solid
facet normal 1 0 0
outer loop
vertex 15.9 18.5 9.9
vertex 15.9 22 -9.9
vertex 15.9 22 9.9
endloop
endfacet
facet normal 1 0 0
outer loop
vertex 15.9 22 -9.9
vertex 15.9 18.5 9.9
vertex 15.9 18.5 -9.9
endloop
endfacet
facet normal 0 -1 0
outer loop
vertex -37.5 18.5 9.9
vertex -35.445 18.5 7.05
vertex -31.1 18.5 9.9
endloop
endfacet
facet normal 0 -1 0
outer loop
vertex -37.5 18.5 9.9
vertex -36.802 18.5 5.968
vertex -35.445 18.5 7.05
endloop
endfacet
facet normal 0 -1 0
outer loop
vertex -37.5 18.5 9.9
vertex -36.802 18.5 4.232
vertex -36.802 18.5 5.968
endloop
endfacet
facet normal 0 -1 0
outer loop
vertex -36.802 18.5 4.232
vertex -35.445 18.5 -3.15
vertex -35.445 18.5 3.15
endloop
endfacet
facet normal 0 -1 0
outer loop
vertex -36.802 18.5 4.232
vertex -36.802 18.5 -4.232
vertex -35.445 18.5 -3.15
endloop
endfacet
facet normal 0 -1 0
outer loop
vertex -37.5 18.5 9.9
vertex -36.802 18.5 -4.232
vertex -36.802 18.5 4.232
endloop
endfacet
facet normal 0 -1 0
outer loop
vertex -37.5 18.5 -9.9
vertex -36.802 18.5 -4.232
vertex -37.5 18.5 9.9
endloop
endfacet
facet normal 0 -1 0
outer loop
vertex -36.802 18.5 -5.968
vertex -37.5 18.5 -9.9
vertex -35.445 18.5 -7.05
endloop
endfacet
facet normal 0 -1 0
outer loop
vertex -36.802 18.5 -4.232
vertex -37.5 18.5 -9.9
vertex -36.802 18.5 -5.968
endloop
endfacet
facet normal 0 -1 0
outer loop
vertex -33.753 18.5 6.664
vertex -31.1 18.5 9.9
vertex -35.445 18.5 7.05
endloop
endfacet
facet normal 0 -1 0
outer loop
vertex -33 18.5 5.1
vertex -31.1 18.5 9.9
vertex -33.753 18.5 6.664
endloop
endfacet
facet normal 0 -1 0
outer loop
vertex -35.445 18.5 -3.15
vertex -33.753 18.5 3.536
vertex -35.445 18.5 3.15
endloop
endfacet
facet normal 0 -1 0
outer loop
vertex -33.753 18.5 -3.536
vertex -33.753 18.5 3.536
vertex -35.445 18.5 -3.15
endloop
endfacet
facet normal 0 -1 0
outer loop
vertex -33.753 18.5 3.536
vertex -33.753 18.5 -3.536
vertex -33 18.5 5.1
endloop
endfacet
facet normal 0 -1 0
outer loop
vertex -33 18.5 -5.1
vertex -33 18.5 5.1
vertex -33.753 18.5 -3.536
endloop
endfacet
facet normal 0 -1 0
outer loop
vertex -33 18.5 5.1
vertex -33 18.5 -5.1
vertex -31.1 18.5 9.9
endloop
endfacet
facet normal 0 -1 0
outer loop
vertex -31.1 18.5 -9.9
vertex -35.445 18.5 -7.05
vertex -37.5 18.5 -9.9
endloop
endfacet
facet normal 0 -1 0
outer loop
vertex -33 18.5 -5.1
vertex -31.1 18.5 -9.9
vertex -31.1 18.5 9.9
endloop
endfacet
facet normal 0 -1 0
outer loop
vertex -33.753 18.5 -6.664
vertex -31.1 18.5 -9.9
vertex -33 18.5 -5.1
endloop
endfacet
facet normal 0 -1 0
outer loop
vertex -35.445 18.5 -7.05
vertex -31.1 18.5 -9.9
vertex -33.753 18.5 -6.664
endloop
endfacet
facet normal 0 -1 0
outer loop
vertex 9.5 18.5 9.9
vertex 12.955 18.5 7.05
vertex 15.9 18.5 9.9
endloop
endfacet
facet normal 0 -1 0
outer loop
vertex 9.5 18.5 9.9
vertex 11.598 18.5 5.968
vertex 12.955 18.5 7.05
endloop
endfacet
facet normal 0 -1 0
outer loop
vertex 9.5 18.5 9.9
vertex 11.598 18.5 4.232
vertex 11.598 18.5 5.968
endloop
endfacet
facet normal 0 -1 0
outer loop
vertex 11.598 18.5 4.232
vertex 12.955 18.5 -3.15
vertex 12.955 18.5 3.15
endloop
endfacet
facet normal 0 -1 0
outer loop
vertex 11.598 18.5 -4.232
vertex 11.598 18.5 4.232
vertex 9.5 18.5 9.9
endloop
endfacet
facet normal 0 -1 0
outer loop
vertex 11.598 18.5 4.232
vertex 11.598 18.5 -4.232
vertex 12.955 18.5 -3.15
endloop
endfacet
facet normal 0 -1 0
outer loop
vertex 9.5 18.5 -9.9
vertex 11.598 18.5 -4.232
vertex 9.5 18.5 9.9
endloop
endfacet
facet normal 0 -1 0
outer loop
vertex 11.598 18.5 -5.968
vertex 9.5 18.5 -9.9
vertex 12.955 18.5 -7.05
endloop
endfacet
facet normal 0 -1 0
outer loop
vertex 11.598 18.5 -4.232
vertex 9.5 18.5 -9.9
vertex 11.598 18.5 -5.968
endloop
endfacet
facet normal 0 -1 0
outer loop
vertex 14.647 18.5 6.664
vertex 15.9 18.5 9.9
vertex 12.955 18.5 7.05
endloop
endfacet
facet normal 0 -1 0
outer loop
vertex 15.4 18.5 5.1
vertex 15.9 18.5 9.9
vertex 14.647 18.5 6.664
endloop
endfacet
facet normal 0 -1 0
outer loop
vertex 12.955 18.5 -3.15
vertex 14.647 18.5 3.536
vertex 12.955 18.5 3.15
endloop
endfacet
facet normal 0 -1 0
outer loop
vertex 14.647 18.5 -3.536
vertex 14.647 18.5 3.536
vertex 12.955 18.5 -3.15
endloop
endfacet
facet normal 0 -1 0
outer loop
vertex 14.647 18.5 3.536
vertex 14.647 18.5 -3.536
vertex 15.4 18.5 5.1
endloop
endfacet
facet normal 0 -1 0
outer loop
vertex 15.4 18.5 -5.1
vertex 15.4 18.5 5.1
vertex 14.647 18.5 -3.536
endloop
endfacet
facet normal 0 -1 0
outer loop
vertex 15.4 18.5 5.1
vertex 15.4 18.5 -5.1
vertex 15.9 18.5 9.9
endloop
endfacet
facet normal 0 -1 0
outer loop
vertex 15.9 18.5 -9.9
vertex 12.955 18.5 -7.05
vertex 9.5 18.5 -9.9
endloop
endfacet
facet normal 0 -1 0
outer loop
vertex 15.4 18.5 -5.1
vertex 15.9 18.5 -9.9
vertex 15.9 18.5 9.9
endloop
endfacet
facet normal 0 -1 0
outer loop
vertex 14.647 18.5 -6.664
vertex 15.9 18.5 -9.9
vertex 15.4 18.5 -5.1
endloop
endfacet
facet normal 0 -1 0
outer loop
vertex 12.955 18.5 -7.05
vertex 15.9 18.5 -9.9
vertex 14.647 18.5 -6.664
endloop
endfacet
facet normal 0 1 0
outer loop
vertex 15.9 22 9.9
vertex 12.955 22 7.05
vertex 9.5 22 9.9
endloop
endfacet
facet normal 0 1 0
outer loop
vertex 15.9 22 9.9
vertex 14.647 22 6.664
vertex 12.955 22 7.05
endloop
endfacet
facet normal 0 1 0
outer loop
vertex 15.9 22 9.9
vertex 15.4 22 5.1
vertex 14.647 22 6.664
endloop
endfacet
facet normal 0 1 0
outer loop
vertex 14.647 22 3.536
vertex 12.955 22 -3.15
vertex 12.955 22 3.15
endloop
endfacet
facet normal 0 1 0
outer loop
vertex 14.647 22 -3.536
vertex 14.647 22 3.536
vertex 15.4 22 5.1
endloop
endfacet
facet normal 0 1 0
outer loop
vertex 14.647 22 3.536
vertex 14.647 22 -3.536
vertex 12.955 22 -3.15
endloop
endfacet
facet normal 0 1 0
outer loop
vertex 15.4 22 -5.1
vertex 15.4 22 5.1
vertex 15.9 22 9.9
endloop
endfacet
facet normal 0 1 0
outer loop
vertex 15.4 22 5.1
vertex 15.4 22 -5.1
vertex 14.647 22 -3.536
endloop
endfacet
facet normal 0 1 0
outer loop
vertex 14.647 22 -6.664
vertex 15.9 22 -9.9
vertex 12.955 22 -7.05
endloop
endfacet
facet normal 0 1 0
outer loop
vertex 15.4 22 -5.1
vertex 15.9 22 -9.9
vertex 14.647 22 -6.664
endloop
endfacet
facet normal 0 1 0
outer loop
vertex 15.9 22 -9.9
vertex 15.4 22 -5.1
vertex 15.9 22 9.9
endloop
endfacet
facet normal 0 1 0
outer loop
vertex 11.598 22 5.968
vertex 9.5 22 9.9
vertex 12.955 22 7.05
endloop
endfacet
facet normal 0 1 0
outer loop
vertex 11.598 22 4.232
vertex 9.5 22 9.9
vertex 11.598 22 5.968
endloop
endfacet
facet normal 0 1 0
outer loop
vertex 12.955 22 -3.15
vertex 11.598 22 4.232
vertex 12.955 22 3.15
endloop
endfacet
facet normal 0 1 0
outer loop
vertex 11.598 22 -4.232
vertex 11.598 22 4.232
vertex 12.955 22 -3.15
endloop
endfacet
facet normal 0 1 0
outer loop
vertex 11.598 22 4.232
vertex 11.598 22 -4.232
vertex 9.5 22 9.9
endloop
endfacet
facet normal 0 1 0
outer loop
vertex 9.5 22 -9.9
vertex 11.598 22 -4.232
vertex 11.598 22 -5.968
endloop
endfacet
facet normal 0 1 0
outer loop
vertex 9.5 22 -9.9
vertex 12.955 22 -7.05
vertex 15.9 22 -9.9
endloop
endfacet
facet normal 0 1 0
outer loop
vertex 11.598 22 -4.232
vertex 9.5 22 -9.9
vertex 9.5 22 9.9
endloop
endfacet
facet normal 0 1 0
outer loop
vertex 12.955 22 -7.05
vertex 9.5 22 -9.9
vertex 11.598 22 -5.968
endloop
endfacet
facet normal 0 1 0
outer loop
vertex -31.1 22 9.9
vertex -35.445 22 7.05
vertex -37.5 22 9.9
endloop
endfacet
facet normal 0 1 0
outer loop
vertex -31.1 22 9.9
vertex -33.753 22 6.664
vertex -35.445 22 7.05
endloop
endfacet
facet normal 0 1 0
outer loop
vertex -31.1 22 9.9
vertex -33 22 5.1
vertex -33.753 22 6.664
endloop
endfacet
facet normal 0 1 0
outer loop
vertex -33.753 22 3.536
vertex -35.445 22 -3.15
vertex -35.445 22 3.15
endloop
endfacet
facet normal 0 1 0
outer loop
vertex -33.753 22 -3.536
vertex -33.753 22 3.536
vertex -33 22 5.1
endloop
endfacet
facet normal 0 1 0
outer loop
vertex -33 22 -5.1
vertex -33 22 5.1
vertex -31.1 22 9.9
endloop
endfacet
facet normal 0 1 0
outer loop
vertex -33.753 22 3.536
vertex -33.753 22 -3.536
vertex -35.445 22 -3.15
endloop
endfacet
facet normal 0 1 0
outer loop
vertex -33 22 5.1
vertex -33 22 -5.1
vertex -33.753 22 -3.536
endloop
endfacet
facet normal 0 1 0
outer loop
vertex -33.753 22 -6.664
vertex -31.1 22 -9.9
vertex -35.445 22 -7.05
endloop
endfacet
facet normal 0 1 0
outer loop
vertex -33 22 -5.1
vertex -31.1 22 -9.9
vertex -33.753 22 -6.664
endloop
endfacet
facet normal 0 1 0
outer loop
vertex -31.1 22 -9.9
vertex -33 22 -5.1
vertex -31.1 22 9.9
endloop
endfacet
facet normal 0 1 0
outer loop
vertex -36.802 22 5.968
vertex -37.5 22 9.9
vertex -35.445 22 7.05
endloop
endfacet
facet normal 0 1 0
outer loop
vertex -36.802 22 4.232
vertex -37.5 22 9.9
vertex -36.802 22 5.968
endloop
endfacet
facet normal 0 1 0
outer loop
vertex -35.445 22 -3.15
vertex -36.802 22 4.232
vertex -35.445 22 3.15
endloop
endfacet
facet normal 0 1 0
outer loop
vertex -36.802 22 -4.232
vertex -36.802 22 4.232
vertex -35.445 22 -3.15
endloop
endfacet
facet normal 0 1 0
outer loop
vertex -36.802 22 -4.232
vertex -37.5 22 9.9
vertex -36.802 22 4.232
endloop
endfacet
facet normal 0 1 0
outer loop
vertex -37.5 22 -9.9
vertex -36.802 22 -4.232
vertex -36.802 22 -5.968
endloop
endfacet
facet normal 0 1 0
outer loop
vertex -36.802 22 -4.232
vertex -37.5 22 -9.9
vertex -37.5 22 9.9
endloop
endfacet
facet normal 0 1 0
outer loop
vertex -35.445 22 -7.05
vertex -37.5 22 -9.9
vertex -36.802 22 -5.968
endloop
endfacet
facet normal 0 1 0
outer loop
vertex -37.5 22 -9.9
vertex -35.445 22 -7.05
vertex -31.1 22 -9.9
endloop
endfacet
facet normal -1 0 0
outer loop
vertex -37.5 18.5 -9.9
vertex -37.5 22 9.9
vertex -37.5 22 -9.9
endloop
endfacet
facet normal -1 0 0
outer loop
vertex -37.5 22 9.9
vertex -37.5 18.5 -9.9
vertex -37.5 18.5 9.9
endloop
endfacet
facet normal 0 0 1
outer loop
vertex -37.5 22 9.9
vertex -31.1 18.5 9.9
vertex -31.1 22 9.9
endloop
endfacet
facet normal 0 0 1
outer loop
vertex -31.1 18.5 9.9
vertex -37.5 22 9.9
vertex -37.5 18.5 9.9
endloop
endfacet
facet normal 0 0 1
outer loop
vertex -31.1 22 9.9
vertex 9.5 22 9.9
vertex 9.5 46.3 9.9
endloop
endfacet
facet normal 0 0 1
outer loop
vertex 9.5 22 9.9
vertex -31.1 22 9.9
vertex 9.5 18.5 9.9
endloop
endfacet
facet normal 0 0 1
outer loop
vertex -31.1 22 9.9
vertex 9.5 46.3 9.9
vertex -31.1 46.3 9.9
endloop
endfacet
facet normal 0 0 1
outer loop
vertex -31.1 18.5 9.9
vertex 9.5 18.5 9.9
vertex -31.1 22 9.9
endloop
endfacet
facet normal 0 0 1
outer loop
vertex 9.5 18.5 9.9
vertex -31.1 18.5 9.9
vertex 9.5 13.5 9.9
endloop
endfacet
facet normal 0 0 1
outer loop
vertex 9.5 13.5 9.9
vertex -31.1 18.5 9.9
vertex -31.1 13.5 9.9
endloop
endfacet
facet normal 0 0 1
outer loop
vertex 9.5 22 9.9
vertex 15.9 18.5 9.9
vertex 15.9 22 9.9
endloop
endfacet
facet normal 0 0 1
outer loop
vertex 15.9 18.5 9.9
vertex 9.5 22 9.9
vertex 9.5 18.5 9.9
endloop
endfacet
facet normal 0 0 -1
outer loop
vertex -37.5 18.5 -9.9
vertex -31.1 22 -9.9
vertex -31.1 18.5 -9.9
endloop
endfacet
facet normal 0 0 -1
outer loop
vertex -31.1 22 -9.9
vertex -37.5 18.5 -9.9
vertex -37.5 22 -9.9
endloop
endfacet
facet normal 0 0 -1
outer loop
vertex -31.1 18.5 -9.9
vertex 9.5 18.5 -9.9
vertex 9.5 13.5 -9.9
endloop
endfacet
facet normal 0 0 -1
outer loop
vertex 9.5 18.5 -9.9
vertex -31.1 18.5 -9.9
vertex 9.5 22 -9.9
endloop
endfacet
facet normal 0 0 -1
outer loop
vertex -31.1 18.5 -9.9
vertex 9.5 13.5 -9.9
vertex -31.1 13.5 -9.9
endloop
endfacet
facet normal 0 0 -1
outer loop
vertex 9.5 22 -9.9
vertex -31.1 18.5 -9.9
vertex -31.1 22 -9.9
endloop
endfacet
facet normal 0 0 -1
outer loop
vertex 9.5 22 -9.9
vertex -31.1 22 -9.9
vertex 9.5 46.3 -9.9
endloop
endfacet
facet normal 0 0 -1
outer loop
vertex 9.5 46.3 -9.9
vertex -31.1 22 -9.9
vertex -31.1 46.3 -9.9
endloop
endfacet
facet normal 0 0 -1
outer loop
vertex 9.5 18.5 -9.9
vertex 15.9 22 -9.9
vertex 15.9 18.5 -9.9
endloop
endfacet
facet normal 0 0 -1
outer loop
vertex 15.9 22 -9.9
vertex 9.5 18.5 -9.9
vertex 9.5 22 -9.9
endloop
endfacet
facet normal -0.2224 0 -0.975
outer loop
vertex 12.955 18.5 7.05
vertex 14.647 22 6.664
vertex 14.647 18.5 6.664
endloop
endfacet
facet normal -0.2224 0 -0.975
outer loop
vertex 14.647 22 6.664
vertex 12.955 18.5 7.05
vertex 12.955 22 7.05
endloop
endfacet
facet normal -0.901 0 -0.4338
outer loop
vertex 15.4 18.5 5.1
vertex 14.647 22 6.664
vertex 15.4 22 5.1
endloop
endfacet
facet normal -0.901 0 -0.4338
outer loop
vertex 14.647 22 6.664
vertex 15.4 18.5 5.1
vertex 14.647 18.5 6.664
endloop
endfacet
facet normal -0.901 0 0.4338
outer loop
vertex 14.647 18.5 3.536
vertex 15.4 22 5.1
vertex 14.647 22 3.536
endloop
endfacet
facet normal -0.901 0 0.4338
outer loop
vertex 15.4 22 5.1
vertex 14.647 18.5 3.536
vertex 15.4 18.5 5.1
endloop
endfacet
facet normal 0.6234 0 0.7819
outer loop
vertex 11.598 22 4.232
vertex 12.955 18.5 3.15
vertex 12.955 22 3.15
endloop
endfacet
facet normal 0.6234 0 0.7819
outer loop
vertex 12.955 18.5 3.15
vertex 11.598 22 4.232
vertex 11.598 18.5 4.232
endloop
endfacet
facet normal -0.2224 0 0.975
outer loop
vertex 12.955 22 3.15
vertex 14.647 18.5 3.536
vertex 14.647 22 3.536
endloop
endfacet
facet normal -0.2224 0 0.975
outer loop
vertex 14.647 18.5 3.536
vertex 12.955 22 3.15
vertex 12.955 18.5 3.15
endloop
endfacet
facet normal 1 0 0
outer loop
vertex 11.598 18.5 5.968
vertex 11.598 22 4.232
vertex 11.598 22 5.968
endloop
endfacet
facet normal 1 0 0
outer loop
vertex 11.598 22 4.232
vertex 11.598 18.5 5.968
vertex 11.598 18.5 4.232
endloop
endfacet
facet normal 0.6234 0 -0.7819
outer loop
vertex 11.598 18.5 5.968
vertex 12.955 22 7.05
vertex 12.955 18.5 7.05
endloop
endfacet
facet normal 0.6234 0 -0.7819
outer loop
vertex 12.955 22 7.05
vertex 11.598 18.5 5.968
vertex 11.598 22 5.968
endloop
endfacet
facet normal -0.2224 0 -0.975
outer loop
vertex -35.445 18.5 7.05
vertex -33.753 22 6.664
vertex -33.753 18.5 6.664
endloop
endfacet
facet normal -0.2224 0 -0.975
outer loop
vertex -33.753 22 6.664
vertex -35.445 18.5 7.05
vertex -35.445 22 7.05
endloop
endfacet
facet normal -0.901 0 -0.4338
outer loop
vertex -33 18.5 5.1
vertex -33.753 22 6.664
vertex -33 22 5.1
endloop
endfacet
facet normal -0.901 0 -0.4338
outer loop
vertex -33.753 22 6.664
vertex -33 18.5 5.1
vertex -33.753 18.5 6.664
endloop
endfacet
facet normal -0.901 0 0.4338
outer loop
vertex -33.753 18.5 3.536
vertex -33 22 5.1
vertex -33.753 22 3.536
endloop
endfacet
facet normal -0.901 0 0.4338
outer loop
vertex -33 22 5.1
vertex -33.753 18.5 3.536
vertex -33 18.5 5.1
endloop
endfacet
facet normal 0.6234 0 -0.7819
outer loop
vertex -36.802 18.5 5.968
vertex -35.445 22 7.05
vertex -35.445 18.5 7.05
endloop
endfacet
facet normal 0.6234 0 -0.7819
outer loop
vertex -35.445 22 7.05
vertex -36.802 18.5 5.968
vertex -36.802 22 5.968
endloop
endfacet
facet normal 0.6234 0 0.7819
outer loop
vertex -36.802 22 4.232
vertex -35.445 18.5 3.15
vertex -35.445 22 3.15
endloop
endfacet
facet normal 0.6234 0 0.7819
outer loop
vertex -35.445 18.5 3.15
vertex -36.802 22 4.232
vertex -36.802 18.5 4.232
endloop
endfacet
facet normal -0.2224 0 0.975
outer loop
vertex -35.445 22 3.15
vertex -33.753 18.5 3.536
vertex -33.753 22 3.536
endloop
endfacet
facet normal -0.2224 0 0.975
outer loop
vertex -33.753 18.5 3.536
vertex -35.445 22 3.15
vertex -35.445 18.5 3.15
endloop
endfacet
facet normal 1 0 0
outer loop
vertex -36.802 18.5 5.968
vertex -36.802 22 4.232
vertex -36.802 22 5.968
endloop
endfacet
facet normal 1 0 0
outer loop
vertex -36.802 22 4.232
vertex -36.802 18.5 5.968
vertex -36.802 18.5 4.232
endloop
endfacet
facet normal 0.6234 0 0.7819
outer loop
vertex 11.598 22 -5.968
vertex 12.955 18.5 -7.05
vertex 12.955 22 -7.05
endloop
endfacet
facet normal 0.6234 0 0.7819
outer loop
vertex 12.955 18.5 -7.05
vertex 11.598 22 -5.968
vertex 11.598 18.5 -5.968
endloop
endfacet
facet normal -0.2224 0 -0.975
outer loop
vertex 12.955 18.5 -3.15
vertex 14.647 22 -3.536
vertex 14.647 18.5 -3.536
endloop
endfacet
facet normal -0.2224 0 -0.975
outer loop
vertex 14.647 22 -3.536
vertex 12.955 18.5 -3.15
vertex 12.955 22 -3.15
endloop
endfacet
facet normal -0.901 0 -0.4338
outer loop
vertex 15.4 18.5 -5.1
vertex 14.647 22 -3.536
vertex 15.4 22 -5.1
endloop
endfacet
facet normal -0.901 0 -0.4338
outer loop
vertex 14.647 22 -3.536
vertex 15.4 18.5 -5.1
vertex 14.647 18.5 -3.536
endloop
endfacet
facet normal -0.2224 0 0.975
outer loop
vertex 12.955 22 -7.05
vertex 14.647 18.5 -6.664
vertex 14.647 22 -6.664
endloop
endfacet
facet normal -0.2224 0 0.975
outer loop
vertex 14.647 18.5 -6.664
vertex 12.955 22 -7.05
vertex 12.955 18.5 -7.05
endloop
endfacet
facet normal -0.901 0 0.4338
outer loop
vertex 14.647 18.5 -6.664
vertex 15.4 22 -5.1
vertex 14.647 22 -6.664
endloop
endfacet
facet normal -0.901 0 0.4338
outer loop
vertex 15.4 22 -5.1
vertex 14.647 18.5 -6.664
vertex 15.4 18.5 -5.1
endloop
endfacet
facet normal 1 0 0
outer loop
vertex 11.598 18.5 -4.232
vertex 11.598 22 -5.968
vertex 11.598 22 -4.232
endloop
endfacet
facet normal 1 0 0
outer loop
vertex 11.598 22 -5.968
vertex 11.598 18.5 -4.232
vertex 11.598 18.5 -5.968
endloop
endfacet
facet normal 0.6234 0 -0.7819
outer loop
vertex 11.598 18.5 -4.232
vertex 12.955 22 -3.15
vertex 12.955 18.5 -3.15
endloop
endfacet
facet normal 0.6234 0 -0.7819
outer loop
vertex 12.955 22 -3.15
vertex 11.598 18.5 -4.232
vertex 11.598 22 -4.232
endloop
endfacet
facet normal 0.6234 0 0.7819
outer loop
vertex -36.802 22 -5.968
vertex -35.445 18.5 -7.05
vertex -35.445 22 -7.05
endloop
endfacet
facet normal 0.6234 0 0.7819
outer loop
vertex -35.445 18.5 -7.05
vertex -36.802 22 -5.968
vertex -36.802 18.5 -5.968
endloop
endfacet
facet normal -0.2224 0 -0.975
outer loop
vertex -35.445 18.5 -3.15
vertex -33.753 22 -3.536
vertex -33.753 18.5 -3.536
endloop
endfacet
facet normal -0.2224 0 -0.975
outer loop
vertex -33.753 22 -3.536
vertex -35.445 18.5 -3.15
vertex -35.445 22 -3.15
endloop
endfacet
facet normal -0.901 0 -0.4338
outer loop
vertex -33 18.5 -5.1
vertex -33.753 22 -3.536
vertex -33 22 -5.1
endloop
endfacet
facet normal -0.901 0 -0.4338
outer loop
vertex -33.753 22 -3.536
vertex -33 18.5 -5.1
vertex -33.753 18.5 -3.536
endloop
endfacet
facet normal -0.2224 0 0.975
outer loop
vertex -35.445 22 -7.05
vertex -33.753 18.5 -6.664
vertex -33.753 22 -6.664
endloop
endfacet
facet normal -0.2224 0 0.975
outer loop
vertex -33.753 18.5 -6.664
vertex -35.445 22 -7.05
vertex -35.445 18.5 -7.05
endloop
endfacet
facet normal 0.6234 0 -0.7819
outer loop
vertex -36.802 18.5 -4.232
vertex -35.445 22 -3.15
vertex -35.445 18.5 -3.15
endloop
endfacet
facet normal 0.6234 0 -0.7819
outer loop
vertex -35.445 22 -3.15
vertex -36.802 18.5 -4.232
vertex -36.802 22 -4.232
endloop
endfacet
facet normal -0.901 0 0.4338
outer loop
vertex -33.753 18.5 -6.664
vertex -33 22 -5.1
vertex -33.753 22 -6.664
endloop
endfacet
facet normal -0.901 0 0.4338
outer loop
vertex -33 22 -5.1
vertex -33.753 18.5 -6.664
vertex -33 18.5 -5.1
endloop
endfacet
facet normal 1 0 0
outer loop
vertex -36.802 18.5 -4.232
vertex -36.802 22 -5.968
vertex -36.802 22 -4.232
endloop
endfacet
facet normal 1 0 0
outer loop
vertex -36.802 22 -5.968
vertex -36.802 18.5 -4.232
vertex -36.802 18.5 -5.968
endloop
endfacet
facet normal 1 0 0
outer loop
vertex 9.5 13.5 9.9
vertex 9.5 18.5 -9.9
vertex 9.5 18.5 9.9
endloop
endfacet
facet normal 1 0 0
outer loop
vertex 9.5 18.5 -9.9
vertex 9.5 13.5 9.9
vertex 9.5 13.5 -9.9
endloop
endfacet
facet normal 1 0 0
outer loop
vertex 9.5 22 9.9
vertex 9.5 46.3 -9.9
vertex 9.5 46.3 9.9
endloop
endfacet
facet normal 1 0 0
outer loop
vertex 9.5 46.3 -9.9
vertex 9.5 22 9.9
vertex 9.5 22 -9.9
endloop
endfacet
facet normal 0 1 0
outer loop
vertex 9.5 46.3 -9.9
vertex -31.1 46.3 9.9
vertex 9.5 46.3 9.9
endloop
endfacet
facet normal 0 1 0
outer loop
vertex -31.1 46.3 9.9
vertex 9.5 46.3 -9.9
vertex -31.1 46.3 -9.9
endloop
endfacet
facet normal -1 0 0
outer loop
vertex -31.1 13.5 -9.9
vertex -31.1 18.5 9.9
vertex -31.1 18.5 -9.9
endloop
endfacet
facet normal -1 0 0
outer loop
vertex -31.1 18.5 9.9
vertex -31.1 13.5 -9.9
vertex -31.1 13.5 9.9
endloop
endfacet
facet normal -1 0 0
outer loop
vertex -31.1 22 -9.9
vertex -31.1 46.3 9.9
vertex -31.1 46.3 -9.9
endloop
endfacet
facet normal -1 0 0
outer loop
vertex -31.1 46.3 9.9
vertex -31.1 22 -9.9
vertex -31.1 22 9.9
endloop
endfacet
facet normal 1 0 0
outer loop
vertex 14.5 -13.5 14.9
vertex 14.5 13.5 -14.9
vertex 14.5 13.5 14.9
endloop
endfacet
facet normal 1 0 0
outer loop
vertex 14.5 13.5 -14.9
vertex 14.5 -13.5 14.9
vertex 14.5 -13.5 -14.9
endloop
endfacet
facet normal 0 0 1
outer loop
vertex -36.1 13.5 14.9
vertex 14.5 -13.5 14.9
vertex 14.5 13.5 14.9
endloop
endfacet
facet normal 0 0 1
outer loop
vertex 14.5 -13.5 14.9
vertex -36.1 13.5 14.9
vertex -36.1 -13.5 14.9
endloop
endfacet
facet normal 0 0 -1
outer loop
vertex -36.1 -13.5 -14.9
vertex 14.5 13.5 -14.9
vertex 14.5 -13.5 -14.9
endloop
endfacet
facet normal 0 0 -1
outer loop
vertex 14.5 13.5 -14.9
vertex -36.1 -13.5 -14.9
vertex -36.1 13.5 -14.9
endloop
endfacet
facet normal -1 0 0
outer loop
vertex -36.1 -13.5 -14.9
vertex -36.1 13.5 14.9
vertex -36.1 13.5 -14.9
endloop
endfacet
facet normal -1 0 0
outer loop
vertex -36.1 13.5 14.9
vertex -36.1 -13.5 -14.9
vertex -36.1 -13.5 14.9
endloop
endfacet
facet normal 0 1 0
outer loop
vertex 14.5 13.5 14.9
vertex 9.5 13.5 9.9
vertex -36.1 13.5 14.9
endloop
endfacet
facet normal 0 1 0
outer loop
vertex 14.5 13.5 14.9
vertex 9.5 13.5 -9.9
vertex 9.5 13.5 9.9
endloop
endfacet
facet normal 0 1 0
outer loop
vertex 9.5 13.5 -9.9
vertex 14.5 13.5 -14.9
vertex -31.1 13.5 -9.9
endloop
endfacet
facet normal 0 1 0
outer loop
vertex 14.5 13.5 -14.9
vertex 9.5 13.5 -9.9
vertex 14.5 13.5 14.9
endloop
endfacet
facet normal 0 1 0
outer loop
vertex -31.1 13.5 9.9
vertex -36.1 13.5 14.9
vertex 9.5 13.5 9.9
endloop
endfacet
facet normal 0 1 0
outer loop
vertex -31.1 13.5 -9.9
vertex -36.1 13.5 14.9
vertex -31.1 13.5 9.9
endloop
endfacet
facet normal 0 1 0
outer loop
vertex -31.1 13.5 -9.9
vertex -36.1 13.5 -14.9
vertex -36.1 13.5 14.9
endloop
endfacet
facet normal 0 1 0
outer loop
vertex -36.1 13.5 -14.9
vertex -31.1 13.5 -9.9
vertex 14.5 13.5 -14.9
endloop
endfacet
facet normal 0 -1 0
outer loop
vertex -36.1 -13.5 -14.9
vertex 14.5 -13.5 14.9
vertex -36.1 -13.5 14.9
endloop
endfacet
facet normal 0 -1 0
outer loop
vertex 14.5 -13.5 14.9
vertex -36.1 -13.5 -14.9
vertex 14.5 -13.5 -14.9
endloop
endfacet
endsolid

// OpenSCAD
//pan and tilt mount for antenna tracker.

tiltBaseDiameter=20;
wallThickness=5;
//Tilt servo HS-645MG Dimensions
servoLength=40.6;
servoWidth=19.8;
servoHeight=37.8;
servoTabLength=53.4;
servoMountHoleCentersWidth=10.2;
servoMountHoleCentersLength=48.4;
servoBelowTabHeight=27;
servoTabHeight=3.5;
servoMountHoleDiameter=4;
servoWheelOffset=9.5;
servoWheelHeightOffset=6.5;
servoWheelDiameter=24;
servoWheelWidth=2;

module tiltServo()
{
	
	//main cube
	cube([servoLength,servoWidth,servoHeight],true);
	//tab
	difference()
	{
		translate([0,0,servoTabHeight/2+(servoHeight-servoBelowTabHeight)/2])
		cube([servoTabLength,servoWidth,servoTabHeight],true);

		translate([servoMountHoleCentersLength/2,servoMountHoleCentersWidth/2,servoTabHeight/2+(servoHeight-servoBelowTabHeight)/2])
		cylinder(servoTabHeight,servoMountHoleDiameter/2,servoMountHoleDiameter/2,true);

		translate([-servoMountHoleCentersLength/2,servoMountHoleCentersWidth/2,servoTabHeight/2+(servoHeight-servoBelowTabHeight)/2])
		cylinder(servoTabHeight,servoMountHoleDiameter/2,servoMountHoleDiameter/2,true);

		translate([servoMountHoleCentersLength/2,-servoMountHoleCentersWidth/2,servoTabHeight/2+(servoHeight-servoBelowTabHeight)/2])
		cylinder(servoTabHeight,servoMountHoleDiameter/2,servoMountHoleDiameter/2,true);

		translate([-servoMountHoleCentersLength/2,-servoMountHoleCentersWidth/2,servoTabHeight/2+(servoHeight-servoBelowTabHeight)/2])
		cylinder(servoTabHeight,servoMountHoleDiameter/2,servoMountHoleDiameter/2,true);
	}
	
	//servoWheel positioned relative to top of wheel
	translate([servoLength/2-servoWheelOffset,0,servoHeight/2+servoWheelHeightOffset+servoWheelWidth/2])
	cylinder(servoWheelWidth,servoWheelDiameter/2,servoWheelDiameter/2,true);
}

module tiltTop()
{
	translate([-servoLength/2+servoWheelOffset,
	,0])
	cube([servoLength+wallThickness*2,servoBelowTabHeight,servoWidth+wallThickness*2],true);
	//servo positioned
	rotate([90,0,0])
	translate([-servoLength/2+servoWheelOffset,0,-servoHeight/2-servoWheelHeightOffset-servoWheelWidth])
	tiltServo();
}

tiltTop();
